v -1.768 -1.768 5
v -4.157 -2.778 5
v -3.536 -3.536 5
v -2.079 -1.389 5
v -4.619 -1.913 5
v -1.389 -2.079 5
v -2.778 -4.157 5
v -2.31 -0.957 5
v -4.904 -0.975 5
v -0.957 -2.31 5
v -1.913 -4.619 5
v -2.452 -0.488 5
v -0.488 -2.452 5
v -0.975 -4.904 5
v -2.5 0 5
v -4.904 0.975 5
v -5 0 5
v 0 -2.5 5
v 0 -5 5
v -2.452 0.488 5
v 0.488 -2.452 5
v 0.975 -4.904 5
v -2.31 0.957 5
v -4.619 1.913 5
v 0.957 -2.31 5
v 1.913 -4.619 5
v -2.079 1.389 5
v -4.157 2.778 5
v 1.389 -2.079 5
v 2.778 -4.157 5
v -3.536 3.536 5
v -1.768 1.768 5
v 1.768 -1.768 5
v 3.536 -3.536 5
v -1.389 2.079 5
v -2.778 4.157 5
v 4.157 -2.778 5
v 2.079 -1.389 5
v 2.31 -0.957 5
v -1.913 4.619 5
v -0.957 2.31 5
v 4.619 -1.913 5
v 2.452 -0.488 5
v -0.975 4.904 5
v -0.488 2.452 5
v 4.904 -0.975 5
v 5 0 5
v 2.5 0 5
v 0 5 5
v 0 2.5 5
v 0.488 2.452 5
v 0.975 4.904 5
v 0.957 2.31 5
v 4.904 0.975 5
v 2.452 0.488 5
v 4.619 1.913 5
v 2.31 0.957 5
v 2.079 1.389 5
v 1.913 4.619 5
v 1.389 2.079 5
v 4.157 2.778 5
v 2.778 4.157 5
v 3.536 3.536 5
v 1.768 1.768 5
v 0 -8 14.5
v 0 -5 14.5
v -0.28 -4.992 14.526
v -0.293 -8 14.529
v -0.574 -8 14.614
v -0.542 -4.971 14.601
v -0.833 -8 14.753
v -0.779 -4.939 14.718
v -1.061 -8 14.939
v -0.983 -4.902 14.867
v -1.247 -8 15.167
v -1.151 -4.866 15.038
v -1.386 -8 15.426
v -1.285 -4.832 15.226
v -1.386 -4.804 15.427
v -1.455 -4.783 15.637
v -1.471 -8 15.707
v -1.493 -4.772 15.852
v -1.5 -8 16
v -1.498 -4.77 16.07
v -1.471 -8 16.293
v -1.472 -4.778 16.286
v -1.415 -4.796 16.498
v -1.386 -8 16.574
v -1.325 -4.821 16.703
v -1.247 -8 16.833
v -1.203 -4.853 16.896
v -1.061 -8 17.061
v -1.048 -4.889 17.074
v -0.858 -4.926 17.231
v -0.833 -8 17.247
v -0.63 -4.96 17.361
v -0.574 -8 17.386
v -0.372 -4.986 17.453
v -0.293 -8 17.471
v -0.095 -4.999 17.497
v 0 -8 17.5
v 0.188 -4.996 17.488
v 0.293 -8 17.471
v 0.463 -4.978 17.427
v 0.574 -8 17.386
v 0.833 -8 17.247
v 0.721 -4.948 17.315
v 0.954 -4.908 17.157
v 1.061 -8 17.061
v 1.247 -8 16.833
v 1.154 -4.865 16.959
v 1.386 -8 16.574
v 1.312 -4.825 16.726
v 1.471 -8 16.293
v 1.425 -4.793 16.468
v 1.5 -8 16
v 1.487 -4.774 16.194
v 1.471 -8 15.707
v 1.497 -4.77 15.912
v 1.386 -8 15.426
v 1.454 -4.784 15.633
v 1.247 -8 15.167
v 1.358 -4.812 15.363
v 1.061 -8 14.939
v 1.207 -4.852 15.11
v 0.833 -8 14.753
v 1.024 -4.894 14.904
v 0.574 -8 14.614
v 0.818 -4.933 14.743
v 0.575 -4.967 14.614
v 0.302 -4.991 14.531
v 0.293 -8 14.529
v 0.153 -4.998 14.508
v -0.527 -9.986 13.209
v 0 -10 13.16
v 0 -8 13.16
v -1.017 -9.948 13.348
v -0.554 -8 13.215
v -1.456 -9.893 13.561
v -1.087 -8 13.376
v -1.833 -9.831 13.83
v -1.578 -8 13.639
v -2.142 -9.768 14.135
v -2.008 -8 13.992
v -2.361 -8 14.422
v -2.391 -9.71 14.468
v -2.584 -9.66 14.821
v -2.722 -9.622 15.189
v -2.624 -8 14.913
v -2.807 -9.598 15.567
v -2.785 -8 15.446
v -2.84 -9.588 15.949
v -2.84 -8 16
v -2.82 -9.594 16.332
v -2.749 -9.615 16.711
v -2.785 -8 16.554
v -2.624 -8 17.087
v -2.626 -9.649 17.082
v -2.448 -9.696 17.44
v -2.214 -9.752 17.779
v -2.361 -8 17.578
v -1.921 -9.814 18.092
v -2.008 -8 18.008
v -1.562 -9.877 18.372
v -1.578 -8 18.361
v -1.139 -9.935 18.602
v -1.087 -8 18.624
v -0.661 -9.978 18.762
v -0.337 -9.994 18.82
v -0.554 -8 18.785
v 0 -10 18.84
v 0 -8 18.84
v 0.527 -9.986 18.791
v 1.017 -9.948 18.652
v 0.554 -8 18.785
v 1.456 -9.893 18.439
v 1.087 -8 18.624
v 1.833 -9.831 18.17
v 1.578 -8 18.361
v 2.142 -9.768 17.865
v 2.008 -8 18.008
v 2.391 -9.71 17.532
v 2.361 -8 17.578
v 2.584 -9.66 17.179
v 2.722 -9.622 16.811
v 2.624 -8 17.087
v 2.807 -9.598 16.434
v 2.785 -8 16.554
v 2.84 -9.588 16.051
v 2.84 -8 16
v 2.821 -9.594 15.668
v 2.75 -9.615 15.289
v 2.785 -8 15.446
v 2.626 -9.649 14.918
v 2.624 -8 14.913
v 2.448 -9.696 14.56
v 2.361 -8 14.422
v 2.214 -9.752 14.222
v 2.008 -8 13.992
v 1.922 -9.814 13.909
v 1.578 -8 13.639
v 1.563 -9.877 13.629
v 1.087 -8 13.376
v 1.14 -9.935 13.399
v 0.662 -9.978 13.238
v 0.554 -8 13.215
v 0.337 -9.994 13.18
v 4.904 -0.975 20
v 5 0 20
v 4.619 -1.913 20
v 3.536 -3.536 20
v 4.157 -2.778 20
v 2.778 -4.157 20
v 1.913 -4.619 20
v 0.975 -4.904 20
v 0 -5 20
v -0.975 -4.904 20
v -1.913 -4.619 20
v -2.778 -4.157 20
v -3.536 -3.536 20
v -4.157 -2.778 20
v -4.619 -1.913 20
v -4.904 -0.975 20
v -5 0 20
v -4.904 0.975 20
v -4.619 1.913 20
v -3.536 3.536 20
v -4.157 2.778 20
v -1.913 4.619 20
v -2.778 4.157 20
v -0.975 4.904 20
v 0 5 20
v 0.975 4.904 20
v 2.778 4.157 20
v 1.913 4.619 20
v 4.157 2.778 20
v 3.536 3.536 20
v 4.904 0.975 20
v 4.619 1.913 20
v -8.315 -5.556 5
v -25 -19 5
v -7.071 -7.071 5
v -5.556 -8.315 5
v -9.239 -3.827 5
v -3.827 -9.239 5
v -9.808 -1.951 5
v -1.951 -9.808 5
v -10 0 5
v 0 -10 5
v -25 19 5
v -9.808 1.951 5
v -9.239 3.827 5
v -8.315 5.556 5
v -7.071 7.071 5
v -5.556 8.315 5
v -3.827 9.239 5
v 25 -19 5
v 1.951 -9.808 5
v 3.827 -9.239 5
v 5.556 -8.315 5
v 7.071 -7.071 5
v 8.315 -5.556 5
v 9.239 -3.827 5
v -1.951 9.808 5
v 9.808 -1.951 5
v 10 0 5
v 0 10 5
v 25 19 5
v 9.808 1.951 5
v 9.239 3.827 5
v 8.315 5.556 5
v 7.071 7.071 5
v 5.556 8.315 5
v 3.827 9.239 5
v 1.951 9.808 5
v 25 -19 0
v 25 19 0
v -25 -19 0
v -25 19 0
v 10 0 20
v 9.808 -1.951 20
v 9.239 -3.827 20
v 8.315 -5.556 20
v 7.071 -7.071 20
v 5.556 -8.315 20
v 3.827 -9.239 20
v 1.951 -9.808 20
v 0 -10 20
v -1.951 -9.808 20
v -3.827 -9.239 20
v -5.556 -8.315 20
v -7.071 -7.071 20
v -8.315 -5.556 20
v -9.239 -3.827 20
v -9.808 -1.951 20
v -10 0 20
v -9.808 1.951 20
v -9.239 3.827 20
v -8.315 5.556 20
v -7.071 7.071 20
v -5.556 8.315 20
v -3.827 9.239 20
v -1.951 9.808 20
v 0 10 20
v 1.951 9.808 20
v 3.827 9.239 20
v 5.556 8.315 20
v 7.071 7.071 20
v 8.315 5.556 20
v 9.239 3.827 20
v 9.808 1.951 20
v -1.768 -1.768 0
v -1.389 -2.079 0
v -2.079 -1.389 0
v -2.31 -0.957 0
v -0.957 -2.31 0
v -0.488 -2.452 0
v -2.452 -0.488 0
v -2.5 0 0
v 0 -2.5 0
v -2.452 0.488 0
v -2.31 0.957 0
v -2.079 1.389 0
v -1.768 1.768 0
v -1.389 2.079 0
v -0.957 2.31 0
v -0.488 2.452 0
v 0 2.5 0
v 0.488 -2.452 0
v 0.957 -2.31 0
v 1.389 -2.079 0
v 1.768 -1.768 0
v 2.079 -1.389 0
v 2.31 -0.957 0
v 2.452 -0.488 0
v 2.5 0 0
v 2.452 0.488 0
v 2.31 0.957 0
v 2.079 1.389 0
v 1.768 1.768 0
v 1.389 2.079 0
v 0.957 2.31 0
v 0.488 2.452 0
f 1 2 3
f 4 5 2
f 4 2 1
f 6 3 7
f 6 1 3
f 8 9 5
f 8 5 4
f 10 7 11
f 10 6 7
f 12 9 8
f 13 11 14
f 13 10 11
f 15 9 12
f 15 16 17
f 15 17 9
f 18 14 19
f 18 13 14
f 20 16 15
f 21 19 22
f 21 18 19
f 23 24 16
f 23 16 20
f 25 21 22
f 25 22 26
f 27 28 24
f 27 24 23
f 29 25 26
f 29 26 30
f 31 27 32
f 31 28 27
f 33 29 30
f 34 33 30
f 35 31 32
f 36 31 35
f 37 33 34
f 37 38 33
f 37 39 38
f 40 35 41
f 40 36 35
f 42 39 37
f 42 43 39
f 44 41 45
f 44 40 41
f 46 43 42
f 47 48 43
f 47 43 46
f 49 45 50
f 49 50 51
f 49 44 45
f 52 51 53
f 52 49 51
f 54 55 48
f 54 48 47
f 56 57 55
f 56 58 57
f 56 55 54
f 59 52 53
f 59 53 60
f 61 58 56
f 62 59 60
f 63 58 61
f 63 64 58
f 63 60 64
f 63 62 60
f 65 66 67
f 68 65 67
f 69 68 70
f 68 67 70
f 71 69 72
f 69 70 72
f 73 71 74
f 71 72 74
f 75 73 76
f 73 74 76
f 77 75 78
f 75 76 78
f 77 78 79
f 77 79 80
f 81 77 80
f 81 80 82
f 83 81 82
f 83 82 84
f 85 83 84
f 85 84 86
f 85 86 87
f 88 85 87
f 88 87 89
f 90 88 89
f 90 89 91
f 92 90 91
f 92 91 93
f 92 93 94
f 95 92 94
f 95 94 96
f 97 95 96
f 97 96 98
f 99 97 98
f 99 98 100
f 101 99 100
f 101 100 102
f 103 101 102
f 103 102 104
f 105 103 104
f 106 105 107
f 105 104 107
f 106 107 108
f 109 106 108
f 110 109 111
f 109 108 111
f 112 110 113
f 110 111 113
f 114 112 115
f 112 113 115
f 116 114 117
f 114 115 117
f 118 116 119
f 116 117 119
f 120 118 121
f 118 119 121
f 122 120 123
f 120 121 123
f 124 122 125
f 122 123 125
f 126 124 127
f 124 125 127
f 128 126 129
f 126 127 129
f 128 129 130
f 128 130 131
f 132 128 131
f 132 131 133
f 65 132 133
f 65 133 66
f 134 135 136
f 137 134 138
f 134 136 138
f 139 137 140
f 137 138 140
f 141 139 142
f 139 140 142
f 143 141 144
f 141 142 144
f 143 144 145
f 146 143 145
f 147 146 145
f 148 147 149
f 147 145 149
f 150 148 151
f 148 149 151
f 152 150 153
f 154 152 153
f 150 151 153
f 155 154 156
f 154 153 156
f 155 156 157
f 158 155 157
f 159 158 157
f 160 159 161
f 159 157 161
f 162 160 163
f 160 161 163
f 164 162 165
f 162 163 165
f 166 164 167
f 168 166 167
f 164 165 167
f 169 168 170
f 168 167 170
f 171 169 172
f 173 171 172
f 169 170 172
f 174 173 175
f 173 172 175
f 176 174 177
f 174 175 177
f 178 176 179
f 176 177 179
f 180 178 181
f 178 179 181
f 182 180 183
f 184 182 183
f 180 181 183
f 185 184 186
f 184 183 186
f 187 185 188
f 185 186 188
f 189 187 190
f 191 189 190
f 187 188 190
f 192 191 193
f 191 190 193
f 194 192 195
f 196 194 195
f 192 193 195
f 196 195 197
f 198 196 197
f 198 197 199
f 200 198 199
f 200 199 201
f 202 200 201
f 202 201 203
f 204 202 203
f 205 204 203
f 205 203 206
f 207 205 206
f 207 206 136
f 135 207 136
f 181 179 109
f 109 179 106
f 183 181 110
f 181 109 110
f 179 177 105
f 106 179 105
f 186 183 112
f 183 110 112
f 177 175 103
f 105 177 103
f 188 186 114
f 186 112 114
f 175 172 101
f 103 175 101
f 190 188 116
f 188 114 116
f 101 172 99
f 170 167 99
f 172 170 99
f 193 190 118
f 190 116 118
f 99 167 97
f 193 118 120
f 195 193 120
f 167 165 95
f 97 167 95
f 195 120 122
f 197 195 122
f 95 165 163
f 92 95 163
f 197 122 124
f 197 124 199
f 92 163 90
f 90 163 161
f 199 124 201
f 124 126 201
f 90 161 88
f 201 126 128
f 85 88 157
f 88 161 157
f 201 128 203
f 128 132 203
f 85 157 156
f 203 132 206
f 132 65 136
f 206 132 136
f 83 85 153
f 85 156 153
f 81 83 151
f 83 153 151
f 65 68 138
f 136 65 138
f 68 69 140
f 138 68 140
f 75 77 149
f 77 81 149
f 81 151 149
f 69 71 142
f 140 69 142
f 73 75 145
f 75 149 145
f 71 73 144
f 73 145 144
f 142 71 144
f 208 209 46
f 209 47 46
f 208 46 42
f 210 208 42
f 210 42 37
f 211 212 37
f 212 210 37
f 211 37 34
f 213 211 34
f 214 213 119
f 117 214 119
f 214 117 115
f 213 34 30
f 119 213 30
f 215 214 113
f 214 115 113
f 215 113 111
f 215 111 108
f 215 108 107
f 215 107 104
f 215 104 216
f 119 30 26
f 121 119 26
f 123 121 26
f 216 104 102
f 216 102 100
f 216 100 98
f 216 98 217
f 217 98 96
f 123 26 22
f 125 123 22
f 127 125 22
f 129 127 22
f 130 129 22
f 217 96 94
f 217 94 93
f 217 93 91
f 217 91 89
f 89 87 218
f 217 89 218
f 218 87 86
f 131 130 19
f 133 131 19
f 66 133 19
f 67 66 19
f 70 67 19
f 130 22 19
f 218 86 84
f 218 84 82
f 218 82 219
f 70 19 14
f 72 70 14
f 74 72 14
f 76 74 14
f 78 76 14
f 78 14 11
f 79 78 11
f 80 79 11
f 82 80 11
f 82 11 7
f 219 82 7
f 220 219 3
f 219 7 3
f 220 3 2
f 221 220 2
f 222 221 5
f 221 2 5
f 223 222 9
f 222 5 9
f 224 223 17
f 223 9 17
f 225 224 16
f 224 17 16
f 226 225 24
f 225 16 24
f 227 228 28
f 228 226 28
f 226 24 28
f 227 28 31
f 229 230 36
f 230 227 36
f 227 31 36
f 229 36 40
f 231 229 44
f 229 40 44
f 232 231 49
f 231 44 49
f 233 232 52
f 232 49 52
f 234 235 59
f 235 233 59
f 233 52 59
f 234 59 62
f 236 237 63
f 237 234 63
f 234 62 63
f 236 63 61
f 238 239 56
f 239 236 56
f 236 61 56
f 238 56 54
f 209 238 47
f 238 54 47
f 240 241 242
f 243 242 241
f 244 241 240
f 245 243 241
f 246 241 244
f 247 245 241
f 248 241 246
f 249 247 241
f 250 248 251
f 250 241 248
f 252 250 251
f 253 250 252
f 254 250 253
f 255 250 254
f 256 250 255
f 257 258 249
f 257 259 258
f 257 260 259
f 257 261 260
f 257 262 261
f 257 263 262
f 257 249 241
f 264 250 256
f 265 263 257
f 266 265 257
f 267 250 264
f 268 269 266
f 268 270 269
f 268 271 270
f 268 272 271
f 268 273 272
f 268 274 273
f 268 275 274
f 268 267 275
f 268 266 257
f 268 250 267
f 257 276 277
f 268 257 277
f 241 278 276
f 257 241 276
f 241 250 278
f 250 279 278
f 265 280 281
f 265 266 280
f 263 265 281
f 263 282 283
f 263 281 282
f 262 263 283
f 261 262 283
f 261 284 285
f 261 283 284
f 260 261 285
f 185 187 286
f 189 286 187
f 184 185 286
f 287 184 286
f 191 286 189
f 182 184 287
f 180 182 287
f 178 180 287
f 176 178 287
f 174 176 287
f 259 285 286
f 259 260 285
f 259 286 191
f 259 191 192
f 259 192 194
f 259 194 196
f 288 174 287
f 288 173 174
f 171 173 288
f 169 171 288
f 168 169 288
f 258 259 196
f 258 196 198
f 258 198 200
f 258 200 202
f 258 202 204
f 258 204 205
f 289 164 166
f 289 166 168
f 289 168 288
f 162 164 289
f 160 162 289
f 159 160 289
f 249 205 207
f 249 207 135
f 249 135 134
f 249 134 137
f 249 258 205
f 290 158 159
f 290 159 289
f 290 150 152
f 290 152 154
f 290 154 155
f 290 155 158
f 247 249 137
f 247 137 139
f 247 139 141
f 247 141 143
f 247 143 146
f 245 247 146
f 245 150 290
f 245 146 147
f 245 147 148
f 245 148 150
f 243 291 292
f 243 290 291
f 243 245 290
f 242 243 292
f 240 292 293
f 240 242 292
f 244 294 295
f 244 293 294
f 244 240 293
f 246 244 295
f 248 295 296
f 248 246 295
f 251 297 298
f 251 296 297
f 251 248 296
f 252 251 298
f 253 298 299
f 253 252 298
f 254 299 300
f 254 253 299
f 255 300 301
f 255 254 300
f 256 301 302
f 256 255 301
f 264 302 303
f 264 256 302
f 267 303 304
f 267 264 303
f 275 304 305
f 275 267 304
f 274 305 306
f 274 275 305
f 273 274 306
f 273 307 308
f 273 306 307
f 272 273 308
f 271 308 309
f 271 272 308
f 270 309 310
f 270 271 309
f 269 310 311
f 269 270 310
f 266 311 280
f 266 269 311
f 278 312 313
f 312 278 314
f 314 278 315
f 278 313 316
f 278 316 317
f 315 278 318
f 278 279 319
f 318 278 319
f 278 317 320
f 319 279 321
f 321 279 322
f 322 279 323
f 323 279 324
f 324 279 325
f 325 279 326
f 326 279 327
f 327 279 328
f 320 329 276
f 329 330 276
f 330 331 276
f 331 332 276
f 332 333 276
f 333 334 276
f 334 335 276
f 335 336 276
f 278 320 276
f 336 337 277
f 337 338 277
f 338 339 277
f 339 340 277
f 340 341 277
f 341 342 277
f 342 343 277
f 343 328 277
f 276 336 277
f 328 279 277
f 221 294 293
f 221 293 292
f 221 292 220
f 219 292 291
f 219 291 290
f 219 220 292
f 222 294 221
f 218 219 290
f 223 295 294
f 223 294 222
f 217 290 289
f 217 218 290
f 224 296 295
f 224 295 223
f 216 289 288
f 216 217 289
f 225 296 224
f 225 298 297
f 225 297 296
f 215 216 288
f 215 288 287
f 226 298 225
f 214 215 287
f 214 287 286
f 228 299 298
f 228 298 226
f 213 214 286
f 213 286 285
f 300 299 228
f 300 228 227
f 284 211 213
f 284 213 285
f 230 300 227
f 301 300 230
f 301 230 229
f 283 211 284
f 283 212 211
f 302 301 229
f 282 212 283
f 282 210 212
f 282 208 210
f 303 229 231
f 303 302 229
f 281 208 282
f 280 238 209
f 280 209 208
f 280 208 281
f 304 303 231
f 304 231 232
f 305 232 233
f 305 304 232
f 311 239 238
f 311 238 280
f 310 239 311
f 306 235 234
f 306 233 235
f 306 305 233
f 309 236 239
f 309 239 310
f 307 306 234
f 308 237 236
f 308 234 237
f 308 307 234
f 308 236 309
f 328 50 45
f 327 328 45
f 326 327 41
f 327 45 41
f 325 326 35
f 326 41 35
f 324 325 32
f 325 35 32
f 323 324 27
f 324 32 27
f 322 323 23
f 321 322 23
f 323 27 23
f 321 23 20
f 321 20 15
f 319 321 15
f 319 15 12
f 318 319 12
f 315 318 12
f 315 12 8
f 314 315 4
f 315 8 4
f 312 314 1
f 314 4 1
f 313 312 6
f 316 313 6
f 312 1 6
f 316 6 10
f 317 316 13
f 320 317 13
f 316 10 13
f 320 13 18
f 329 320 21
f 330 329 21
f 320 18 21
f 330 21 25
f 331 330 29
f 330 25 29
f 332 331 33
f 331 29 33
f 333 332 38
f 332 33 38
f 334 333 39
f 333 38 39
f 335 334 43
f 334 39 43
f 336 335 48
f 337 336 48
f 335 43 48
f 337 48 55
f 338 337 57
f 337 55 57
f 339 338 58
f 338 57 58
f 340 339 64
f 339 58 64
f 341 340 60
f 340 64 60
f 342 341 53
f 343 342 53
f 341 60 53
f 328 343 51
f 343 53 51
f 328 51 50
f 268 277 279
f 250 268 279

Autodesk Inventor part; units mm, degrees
ref_plane "YZ Plane" through (0, 0, 0) normal (1, 0, 0) x (0, 1, 0)
ref_plane "XY Plane" through (0, 0, 0) normal (0, 0, 1) x (1, 0, 0)
sketch "Skizze1" plane through (0, 0, 0) normal (0, 0, 1) x (1, 0, 0)
  line L0 (-25, -19) -> (25, -19)
  line L1 (25, -19) -> (25, 19)
  line L2 (25, 19) -> (-25, 19)
  line L3 (-25, 19) -> (-25, -19)
  line L4 (-25, -19) -> (25, 19) construction
  line L5 (25, -19) -> (-25, 19) construction
  point P0 (0, 0)
  dimension "d0" = 50
  dimension "d1" = 38
extrude "Extrusion1" add sketch "Skizze1" along normal blind 5
sketch "Skizze2" plane through (0, 0, 5) normal (0, 0, 1) x (1, 0, 0)
  point P0 (0, 0)
ref_plane "Arbeitsebene1" through (0, 19, 0) normal (0, 1, 0) x (-1, 0, 0)
ref_plane "Arbeitsebene2" through (0, -19, 0) normal (0, 1, 0) x (-1, 0, 0)
sketch "Skizze4" plane through (0, 0, 5) normal (0, 0, 1) x (1, 0, 0)
  circle A0 centre (0, 0) radius 10
  circle A1 centre (0, 0) radius 5
  dimension "d12" = 20
  dimension "d13" = 10
extrude "Extrusion2" add sketch "Skizze4" along normal blind 15
ref_plane "Arbeitsebene3" through (0, -10, 0) normal (0, 1, 0) x (-1, 0, 0)
sketch "Skizze5" plane through (0, -10, 0) normal (0, 1, 0) x (-1, 0, 0)
  line L0 (10, 20) -> (-10, 20) projected
  point P0 (0, 0)
  point P1 (0, 16)
  dimension "d17" = 4
hole "Bohrung1" at (0, -10, 16) direction (0, 1, 0) diameter 3 depth 8 tip angle 118 counterbore diameter 5.68 counterbore depth 2
sketch "Skizze6" plane through (0, -10, 0) normal (0, 1, 0) x (-1, 0, 0)
  point P0 (0, 0)
sketch "Skizze7" plane through (0, 0, 0) normal (0, 0, -1) x (-1, 0, 0)
  circle A0 centre (0, 0) radius 2.5
  dimension "d25" = 5
hole "Bohrung2" at (0, 0, 0) direction (0, 0, 1) diameter 5 depth 5 tip angle 118
properties part number "Laserhalter Unterteil 29112018"
